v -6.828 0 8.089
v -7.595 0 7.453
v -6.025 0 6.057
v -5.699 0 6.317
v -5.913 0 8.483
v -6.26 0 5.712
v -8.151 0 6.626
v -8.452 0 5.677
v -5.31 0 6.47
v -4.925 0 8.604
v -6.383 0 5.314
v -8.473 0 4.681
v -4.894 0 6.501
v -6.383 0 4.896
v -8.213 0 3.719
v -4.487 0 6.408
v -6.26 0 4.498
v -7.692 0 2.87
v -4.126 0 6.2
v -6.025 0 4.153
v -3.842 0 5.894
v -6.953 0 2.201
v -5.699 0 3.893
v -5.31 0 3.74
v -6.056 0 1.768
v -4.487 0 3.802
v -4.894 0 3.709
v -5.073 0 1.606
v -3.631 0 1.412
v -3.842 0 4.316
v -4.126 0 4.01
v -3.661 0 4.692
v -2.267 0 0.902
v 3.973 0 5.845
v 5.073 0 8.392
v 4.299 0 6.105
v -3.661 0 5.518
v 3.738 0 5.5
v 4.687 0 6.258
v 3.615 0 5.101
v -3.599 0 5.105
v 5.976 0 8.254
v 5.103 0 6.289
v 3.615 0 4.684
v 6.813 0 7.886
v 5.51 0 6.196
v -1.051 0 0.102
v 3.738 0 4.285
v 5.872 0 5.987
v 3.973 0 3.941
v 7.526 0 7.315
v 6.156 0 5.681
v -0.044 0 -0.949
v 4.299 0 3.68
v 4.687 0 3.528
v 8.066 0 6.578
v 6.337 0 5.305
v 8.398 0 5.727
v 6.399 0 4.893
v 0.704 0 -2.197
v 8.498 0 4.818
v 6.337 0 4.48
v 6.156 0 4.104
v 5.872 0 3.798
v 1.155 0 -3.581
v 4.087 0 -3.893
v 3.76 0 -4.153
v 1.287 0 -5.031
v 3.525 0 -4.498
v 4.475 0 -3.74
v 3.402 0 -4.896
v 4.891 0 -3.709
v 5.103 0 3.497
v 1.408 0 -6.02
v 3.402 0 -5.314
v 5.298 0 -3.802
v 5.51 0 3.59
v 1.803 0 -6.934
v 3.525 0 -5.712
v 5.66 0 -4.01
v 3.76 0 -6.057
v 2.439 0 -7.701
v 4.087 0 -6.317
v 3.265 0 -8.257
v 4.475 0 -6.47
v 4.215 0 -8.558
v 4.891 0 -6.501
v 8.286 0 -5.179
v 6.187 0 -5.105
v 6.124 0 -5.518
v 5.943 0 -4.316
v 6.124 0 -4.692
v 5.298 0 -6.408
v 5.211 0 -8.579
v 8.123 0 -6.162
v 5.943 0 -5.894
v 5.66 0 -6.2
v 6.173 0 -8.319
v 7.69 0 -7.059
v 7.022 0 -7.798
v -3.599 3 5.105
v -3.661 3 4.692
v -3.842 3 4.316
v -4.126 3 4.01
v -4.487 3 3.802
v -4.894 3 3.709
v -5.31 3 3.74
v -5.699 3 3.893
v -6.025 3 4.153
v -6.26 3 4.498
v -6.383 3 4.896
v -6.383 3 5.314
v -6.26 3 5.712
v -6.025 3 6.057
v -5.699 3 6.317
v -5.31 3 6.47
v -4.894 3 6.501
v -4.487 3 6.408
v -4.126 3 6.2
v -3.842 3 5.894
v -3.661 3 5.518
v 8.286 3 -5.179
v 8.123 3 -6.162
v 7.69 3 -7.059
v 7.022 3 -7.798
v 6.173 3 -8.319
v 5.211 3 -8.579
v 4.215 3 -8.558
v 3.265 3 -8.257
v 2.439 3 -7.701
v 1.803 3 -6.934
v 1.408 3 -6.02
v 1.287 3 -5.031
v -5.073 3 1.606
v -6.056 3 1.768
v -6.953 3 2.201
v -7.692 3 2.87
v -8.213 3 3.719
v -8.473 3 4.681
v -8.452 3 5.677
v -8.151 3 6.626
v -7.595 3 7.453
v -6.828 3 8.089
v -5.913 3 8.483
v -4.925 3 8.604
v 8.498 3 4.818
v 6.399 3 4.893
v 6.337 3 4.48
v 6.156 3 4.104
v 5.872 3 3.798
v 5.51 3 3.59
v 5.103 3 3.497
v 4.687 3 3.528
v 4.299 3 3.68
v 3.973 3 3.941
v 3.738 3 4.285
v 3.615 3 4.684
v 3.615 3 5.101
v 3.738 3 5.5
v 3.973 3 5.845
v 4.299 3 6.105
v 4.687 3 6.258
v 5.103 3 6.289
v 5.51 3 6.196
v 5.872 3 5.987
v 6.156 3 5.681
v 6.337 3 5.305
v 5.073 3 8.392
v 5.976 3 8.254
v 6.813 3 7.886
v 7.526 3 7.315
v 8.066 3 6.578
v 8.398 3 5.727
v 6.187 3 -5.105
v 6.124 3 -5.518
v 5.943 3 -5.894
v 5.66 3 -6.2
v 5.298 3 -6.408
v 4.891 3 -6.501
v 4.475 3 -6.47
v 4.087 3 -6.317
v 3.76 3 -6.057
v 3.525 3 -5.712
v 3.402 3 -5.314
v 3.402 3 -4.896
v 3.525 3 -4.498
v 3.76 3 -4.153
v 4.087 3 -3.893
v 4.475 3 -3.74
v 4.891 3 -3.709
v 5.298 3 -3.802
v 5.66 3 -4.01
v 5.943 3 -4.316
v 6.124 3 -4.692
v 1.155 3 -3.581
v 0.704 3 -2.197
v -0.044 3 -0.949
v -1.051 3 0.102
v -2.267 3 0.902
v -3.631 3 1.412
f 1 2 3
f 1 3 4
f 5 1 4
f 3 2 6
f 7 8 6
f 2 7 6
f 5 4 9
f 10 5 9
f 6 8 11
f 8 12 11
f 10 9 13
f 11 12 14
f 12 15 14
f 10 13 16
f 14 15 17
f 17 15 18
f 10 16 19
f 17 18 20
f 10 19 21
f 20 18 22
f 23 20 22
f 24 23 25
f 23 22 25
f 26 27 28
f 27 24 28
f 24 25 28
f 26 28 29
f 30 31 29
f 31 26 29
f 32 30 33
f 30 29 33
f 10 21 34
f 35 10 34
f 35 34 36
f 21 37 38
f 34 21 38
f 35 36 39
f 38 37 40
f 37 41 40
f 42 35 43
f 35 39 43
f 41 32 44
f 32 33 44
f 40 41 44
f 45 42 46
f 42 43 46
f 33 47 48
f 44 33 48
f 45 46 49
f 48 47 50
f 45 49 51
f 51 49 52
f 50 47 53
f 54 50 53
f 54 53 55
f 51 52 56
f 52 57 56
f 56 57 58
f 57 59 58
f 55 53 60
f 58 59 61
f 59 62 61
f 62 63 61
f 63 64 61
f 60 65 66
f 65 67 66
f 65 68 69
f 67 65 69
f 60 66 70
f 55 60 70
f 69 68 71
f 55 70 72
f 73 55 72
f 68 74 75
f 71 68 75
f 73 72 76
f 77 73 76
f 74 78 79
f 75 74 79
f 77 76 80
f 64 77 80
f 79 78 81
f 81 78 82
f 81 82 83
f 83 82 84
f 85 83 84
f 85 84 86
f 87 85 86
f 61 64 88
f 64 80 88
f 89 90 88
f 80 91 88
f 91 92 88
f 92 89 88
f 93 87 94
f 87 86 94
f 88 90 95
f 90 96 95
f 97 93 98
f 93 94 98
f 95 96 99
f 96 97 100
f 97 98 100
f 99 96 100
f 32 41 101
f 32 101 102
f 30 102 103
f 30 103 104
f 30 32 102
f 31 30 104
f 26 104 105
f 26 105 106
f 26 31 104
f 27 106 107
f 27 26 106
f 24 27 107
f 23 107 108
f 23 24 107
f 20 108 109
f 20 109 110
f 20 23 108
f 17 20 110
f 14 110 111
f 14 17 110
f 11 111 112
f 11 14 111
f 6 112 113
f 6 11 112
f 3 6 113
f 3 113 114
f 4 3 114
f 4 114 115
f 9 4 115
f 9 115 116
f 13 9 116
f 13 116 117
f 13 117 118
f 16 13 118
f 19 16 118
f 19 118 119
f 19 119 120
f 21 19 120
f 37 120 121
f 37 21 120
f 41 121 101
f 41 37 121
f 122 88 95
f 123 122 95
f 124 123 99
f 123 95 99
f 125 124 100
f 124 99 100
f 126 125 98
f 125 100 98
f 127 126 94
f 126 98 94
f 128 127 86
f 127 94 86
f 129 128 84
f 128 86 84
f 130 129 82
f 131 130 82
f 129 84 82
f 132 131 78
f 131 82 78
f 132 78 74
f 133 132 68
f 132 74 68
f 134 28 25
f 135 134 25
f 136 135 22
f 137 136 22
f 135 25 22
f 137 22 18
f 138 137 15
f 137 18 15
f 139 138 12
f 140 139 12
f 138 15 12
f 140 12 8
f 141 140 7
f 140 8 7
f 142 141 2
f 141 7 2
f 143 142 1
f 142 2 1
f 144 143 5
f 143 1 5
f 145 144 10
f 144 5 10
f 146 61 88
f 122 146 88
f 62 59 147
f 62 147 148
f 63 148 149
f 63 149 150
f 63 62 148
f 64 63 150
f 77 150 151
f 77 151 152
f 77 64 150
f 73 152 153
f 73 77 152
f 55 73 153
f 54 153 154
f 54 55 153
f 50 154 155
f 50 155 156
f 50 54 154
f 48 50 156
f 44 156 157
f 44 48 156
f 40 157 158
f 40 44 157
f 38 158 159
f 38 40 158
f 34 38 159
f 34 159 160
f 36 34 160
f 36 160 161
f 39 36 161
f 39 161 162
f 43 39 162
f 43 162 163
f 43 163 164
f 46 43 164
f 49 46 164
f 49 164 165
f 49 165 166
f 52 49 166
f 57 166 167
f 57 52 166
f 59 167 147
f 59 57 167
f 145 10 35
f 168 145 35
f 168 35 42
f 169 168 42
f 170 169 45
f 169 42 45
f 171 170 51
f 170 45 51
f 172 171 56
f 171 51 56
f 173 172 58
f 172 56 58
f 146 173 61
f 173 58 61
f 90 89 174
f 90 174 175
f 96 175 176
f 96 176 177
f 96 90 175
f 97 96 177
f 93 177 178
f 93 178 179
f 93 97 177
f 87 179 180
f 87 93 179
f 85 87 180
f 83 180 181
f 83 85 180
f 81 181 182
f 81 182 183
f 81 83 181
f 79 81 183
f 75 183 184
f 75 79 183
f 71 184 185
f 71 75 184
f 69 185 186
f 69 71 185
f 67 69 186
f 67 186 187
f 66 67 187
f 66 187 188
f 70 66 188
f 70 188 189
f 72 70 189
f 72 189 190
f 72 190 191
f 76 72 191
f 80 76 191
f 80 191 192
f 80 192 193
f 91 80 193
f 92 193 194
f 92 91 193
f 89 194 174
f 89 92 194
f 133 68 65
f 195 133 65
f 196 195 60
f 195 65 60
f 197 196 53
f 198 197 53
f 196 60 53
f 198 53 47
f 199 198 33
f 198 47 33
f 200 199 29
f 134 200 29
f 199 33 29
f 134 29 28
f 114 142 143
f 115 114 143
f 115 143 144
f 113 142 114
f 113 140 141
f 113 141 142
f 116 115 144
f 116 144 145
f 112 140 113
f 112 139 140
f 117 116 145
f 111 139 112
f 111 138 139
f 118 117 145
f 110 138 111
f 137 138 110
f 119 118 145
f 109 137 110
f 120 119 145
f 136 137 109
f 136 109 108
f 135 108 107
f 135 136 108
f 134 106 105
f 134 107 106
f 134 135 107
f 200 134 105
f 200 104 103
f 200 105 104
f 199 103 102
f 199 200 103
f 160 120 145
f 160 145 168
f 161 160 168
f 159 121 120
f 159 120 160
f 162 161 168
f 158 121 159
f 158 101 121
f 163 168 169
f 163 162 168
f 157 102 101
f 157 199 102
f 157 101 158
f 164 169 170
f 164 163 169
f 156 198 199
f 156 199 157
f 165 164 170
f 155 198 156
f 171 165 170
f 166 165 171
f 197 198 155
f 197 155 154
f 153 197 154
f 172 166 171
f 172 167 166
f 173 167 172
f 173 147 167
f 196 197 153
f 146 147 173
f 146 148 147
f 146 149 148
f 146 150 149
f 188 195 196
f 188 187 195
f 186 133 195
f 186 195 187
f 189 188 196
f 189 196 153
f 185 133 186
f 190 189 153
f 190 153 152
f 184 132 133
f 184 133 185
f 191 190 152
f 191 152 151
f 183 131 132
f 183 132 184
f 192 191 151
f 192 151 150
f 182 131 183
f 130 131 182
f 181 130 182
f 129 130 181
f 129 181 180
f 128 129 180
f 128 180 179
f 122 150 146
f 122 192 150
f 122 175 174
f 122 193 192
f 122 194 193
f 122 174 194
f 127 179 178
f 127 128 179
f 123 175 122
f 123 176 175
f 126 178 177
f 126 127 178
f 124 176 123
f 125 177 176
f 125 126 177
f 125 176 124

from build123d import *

# Parameters (mm, degrees)
SKETCH1_R           = 1.4
BOSS_EXTRUDE1_DEPTH = 3


with BuildPart() as part:
    # Sketch1 → Boss-Extrude1 (new body)
    with BuildSketch(Plane(origin=(0, 0, 0), x_dir=(1, 0, 0), z_dir=(0, 1, 0))):
        with BuildLine():
            Line((8.498085152, -4.818460921), (8.285834919, 5.179286318))
            ThreePointArc((8.285834919, 5.179286318), (4.712335804, 8.604210269), (1.287411852, 5.030711154))
            ThreePointArc((1.287411852, 5.030711154), (-0.518410861, 0.395144164), (-5.073161201, -1.605787202))
            ThreePointArc((-5.073161201, -1.605787202), (-8.498085152, -5.179286318), (-4.924586037, -8.604210269))
            Line((-4.924586037, -8.604210269), (5.073161201, -8.391960036))
            ThreePointArc((5.073161201, -8.391960036), (7.525719076, -7.314535454), (8.498085152, -4.818460921))
        make_face()
        with Locations((4.786623386, 5.104998736)):
            Circle(SKETCH1_R, mode=Mode.SUBTRACT)
        with Locations((4.998873619, -4.892748502)):
            Circle(SKETCH1_R, mode=Mode.SUBTRACT)
        with Locations((-4.998873619, -5.104998736)):
            Circle(SKETCH1_R, mode=Mode.SUBTRACT)
    extrude(amount=BOSS_EXTRUDE1_DEPTH)


solid = part.part
